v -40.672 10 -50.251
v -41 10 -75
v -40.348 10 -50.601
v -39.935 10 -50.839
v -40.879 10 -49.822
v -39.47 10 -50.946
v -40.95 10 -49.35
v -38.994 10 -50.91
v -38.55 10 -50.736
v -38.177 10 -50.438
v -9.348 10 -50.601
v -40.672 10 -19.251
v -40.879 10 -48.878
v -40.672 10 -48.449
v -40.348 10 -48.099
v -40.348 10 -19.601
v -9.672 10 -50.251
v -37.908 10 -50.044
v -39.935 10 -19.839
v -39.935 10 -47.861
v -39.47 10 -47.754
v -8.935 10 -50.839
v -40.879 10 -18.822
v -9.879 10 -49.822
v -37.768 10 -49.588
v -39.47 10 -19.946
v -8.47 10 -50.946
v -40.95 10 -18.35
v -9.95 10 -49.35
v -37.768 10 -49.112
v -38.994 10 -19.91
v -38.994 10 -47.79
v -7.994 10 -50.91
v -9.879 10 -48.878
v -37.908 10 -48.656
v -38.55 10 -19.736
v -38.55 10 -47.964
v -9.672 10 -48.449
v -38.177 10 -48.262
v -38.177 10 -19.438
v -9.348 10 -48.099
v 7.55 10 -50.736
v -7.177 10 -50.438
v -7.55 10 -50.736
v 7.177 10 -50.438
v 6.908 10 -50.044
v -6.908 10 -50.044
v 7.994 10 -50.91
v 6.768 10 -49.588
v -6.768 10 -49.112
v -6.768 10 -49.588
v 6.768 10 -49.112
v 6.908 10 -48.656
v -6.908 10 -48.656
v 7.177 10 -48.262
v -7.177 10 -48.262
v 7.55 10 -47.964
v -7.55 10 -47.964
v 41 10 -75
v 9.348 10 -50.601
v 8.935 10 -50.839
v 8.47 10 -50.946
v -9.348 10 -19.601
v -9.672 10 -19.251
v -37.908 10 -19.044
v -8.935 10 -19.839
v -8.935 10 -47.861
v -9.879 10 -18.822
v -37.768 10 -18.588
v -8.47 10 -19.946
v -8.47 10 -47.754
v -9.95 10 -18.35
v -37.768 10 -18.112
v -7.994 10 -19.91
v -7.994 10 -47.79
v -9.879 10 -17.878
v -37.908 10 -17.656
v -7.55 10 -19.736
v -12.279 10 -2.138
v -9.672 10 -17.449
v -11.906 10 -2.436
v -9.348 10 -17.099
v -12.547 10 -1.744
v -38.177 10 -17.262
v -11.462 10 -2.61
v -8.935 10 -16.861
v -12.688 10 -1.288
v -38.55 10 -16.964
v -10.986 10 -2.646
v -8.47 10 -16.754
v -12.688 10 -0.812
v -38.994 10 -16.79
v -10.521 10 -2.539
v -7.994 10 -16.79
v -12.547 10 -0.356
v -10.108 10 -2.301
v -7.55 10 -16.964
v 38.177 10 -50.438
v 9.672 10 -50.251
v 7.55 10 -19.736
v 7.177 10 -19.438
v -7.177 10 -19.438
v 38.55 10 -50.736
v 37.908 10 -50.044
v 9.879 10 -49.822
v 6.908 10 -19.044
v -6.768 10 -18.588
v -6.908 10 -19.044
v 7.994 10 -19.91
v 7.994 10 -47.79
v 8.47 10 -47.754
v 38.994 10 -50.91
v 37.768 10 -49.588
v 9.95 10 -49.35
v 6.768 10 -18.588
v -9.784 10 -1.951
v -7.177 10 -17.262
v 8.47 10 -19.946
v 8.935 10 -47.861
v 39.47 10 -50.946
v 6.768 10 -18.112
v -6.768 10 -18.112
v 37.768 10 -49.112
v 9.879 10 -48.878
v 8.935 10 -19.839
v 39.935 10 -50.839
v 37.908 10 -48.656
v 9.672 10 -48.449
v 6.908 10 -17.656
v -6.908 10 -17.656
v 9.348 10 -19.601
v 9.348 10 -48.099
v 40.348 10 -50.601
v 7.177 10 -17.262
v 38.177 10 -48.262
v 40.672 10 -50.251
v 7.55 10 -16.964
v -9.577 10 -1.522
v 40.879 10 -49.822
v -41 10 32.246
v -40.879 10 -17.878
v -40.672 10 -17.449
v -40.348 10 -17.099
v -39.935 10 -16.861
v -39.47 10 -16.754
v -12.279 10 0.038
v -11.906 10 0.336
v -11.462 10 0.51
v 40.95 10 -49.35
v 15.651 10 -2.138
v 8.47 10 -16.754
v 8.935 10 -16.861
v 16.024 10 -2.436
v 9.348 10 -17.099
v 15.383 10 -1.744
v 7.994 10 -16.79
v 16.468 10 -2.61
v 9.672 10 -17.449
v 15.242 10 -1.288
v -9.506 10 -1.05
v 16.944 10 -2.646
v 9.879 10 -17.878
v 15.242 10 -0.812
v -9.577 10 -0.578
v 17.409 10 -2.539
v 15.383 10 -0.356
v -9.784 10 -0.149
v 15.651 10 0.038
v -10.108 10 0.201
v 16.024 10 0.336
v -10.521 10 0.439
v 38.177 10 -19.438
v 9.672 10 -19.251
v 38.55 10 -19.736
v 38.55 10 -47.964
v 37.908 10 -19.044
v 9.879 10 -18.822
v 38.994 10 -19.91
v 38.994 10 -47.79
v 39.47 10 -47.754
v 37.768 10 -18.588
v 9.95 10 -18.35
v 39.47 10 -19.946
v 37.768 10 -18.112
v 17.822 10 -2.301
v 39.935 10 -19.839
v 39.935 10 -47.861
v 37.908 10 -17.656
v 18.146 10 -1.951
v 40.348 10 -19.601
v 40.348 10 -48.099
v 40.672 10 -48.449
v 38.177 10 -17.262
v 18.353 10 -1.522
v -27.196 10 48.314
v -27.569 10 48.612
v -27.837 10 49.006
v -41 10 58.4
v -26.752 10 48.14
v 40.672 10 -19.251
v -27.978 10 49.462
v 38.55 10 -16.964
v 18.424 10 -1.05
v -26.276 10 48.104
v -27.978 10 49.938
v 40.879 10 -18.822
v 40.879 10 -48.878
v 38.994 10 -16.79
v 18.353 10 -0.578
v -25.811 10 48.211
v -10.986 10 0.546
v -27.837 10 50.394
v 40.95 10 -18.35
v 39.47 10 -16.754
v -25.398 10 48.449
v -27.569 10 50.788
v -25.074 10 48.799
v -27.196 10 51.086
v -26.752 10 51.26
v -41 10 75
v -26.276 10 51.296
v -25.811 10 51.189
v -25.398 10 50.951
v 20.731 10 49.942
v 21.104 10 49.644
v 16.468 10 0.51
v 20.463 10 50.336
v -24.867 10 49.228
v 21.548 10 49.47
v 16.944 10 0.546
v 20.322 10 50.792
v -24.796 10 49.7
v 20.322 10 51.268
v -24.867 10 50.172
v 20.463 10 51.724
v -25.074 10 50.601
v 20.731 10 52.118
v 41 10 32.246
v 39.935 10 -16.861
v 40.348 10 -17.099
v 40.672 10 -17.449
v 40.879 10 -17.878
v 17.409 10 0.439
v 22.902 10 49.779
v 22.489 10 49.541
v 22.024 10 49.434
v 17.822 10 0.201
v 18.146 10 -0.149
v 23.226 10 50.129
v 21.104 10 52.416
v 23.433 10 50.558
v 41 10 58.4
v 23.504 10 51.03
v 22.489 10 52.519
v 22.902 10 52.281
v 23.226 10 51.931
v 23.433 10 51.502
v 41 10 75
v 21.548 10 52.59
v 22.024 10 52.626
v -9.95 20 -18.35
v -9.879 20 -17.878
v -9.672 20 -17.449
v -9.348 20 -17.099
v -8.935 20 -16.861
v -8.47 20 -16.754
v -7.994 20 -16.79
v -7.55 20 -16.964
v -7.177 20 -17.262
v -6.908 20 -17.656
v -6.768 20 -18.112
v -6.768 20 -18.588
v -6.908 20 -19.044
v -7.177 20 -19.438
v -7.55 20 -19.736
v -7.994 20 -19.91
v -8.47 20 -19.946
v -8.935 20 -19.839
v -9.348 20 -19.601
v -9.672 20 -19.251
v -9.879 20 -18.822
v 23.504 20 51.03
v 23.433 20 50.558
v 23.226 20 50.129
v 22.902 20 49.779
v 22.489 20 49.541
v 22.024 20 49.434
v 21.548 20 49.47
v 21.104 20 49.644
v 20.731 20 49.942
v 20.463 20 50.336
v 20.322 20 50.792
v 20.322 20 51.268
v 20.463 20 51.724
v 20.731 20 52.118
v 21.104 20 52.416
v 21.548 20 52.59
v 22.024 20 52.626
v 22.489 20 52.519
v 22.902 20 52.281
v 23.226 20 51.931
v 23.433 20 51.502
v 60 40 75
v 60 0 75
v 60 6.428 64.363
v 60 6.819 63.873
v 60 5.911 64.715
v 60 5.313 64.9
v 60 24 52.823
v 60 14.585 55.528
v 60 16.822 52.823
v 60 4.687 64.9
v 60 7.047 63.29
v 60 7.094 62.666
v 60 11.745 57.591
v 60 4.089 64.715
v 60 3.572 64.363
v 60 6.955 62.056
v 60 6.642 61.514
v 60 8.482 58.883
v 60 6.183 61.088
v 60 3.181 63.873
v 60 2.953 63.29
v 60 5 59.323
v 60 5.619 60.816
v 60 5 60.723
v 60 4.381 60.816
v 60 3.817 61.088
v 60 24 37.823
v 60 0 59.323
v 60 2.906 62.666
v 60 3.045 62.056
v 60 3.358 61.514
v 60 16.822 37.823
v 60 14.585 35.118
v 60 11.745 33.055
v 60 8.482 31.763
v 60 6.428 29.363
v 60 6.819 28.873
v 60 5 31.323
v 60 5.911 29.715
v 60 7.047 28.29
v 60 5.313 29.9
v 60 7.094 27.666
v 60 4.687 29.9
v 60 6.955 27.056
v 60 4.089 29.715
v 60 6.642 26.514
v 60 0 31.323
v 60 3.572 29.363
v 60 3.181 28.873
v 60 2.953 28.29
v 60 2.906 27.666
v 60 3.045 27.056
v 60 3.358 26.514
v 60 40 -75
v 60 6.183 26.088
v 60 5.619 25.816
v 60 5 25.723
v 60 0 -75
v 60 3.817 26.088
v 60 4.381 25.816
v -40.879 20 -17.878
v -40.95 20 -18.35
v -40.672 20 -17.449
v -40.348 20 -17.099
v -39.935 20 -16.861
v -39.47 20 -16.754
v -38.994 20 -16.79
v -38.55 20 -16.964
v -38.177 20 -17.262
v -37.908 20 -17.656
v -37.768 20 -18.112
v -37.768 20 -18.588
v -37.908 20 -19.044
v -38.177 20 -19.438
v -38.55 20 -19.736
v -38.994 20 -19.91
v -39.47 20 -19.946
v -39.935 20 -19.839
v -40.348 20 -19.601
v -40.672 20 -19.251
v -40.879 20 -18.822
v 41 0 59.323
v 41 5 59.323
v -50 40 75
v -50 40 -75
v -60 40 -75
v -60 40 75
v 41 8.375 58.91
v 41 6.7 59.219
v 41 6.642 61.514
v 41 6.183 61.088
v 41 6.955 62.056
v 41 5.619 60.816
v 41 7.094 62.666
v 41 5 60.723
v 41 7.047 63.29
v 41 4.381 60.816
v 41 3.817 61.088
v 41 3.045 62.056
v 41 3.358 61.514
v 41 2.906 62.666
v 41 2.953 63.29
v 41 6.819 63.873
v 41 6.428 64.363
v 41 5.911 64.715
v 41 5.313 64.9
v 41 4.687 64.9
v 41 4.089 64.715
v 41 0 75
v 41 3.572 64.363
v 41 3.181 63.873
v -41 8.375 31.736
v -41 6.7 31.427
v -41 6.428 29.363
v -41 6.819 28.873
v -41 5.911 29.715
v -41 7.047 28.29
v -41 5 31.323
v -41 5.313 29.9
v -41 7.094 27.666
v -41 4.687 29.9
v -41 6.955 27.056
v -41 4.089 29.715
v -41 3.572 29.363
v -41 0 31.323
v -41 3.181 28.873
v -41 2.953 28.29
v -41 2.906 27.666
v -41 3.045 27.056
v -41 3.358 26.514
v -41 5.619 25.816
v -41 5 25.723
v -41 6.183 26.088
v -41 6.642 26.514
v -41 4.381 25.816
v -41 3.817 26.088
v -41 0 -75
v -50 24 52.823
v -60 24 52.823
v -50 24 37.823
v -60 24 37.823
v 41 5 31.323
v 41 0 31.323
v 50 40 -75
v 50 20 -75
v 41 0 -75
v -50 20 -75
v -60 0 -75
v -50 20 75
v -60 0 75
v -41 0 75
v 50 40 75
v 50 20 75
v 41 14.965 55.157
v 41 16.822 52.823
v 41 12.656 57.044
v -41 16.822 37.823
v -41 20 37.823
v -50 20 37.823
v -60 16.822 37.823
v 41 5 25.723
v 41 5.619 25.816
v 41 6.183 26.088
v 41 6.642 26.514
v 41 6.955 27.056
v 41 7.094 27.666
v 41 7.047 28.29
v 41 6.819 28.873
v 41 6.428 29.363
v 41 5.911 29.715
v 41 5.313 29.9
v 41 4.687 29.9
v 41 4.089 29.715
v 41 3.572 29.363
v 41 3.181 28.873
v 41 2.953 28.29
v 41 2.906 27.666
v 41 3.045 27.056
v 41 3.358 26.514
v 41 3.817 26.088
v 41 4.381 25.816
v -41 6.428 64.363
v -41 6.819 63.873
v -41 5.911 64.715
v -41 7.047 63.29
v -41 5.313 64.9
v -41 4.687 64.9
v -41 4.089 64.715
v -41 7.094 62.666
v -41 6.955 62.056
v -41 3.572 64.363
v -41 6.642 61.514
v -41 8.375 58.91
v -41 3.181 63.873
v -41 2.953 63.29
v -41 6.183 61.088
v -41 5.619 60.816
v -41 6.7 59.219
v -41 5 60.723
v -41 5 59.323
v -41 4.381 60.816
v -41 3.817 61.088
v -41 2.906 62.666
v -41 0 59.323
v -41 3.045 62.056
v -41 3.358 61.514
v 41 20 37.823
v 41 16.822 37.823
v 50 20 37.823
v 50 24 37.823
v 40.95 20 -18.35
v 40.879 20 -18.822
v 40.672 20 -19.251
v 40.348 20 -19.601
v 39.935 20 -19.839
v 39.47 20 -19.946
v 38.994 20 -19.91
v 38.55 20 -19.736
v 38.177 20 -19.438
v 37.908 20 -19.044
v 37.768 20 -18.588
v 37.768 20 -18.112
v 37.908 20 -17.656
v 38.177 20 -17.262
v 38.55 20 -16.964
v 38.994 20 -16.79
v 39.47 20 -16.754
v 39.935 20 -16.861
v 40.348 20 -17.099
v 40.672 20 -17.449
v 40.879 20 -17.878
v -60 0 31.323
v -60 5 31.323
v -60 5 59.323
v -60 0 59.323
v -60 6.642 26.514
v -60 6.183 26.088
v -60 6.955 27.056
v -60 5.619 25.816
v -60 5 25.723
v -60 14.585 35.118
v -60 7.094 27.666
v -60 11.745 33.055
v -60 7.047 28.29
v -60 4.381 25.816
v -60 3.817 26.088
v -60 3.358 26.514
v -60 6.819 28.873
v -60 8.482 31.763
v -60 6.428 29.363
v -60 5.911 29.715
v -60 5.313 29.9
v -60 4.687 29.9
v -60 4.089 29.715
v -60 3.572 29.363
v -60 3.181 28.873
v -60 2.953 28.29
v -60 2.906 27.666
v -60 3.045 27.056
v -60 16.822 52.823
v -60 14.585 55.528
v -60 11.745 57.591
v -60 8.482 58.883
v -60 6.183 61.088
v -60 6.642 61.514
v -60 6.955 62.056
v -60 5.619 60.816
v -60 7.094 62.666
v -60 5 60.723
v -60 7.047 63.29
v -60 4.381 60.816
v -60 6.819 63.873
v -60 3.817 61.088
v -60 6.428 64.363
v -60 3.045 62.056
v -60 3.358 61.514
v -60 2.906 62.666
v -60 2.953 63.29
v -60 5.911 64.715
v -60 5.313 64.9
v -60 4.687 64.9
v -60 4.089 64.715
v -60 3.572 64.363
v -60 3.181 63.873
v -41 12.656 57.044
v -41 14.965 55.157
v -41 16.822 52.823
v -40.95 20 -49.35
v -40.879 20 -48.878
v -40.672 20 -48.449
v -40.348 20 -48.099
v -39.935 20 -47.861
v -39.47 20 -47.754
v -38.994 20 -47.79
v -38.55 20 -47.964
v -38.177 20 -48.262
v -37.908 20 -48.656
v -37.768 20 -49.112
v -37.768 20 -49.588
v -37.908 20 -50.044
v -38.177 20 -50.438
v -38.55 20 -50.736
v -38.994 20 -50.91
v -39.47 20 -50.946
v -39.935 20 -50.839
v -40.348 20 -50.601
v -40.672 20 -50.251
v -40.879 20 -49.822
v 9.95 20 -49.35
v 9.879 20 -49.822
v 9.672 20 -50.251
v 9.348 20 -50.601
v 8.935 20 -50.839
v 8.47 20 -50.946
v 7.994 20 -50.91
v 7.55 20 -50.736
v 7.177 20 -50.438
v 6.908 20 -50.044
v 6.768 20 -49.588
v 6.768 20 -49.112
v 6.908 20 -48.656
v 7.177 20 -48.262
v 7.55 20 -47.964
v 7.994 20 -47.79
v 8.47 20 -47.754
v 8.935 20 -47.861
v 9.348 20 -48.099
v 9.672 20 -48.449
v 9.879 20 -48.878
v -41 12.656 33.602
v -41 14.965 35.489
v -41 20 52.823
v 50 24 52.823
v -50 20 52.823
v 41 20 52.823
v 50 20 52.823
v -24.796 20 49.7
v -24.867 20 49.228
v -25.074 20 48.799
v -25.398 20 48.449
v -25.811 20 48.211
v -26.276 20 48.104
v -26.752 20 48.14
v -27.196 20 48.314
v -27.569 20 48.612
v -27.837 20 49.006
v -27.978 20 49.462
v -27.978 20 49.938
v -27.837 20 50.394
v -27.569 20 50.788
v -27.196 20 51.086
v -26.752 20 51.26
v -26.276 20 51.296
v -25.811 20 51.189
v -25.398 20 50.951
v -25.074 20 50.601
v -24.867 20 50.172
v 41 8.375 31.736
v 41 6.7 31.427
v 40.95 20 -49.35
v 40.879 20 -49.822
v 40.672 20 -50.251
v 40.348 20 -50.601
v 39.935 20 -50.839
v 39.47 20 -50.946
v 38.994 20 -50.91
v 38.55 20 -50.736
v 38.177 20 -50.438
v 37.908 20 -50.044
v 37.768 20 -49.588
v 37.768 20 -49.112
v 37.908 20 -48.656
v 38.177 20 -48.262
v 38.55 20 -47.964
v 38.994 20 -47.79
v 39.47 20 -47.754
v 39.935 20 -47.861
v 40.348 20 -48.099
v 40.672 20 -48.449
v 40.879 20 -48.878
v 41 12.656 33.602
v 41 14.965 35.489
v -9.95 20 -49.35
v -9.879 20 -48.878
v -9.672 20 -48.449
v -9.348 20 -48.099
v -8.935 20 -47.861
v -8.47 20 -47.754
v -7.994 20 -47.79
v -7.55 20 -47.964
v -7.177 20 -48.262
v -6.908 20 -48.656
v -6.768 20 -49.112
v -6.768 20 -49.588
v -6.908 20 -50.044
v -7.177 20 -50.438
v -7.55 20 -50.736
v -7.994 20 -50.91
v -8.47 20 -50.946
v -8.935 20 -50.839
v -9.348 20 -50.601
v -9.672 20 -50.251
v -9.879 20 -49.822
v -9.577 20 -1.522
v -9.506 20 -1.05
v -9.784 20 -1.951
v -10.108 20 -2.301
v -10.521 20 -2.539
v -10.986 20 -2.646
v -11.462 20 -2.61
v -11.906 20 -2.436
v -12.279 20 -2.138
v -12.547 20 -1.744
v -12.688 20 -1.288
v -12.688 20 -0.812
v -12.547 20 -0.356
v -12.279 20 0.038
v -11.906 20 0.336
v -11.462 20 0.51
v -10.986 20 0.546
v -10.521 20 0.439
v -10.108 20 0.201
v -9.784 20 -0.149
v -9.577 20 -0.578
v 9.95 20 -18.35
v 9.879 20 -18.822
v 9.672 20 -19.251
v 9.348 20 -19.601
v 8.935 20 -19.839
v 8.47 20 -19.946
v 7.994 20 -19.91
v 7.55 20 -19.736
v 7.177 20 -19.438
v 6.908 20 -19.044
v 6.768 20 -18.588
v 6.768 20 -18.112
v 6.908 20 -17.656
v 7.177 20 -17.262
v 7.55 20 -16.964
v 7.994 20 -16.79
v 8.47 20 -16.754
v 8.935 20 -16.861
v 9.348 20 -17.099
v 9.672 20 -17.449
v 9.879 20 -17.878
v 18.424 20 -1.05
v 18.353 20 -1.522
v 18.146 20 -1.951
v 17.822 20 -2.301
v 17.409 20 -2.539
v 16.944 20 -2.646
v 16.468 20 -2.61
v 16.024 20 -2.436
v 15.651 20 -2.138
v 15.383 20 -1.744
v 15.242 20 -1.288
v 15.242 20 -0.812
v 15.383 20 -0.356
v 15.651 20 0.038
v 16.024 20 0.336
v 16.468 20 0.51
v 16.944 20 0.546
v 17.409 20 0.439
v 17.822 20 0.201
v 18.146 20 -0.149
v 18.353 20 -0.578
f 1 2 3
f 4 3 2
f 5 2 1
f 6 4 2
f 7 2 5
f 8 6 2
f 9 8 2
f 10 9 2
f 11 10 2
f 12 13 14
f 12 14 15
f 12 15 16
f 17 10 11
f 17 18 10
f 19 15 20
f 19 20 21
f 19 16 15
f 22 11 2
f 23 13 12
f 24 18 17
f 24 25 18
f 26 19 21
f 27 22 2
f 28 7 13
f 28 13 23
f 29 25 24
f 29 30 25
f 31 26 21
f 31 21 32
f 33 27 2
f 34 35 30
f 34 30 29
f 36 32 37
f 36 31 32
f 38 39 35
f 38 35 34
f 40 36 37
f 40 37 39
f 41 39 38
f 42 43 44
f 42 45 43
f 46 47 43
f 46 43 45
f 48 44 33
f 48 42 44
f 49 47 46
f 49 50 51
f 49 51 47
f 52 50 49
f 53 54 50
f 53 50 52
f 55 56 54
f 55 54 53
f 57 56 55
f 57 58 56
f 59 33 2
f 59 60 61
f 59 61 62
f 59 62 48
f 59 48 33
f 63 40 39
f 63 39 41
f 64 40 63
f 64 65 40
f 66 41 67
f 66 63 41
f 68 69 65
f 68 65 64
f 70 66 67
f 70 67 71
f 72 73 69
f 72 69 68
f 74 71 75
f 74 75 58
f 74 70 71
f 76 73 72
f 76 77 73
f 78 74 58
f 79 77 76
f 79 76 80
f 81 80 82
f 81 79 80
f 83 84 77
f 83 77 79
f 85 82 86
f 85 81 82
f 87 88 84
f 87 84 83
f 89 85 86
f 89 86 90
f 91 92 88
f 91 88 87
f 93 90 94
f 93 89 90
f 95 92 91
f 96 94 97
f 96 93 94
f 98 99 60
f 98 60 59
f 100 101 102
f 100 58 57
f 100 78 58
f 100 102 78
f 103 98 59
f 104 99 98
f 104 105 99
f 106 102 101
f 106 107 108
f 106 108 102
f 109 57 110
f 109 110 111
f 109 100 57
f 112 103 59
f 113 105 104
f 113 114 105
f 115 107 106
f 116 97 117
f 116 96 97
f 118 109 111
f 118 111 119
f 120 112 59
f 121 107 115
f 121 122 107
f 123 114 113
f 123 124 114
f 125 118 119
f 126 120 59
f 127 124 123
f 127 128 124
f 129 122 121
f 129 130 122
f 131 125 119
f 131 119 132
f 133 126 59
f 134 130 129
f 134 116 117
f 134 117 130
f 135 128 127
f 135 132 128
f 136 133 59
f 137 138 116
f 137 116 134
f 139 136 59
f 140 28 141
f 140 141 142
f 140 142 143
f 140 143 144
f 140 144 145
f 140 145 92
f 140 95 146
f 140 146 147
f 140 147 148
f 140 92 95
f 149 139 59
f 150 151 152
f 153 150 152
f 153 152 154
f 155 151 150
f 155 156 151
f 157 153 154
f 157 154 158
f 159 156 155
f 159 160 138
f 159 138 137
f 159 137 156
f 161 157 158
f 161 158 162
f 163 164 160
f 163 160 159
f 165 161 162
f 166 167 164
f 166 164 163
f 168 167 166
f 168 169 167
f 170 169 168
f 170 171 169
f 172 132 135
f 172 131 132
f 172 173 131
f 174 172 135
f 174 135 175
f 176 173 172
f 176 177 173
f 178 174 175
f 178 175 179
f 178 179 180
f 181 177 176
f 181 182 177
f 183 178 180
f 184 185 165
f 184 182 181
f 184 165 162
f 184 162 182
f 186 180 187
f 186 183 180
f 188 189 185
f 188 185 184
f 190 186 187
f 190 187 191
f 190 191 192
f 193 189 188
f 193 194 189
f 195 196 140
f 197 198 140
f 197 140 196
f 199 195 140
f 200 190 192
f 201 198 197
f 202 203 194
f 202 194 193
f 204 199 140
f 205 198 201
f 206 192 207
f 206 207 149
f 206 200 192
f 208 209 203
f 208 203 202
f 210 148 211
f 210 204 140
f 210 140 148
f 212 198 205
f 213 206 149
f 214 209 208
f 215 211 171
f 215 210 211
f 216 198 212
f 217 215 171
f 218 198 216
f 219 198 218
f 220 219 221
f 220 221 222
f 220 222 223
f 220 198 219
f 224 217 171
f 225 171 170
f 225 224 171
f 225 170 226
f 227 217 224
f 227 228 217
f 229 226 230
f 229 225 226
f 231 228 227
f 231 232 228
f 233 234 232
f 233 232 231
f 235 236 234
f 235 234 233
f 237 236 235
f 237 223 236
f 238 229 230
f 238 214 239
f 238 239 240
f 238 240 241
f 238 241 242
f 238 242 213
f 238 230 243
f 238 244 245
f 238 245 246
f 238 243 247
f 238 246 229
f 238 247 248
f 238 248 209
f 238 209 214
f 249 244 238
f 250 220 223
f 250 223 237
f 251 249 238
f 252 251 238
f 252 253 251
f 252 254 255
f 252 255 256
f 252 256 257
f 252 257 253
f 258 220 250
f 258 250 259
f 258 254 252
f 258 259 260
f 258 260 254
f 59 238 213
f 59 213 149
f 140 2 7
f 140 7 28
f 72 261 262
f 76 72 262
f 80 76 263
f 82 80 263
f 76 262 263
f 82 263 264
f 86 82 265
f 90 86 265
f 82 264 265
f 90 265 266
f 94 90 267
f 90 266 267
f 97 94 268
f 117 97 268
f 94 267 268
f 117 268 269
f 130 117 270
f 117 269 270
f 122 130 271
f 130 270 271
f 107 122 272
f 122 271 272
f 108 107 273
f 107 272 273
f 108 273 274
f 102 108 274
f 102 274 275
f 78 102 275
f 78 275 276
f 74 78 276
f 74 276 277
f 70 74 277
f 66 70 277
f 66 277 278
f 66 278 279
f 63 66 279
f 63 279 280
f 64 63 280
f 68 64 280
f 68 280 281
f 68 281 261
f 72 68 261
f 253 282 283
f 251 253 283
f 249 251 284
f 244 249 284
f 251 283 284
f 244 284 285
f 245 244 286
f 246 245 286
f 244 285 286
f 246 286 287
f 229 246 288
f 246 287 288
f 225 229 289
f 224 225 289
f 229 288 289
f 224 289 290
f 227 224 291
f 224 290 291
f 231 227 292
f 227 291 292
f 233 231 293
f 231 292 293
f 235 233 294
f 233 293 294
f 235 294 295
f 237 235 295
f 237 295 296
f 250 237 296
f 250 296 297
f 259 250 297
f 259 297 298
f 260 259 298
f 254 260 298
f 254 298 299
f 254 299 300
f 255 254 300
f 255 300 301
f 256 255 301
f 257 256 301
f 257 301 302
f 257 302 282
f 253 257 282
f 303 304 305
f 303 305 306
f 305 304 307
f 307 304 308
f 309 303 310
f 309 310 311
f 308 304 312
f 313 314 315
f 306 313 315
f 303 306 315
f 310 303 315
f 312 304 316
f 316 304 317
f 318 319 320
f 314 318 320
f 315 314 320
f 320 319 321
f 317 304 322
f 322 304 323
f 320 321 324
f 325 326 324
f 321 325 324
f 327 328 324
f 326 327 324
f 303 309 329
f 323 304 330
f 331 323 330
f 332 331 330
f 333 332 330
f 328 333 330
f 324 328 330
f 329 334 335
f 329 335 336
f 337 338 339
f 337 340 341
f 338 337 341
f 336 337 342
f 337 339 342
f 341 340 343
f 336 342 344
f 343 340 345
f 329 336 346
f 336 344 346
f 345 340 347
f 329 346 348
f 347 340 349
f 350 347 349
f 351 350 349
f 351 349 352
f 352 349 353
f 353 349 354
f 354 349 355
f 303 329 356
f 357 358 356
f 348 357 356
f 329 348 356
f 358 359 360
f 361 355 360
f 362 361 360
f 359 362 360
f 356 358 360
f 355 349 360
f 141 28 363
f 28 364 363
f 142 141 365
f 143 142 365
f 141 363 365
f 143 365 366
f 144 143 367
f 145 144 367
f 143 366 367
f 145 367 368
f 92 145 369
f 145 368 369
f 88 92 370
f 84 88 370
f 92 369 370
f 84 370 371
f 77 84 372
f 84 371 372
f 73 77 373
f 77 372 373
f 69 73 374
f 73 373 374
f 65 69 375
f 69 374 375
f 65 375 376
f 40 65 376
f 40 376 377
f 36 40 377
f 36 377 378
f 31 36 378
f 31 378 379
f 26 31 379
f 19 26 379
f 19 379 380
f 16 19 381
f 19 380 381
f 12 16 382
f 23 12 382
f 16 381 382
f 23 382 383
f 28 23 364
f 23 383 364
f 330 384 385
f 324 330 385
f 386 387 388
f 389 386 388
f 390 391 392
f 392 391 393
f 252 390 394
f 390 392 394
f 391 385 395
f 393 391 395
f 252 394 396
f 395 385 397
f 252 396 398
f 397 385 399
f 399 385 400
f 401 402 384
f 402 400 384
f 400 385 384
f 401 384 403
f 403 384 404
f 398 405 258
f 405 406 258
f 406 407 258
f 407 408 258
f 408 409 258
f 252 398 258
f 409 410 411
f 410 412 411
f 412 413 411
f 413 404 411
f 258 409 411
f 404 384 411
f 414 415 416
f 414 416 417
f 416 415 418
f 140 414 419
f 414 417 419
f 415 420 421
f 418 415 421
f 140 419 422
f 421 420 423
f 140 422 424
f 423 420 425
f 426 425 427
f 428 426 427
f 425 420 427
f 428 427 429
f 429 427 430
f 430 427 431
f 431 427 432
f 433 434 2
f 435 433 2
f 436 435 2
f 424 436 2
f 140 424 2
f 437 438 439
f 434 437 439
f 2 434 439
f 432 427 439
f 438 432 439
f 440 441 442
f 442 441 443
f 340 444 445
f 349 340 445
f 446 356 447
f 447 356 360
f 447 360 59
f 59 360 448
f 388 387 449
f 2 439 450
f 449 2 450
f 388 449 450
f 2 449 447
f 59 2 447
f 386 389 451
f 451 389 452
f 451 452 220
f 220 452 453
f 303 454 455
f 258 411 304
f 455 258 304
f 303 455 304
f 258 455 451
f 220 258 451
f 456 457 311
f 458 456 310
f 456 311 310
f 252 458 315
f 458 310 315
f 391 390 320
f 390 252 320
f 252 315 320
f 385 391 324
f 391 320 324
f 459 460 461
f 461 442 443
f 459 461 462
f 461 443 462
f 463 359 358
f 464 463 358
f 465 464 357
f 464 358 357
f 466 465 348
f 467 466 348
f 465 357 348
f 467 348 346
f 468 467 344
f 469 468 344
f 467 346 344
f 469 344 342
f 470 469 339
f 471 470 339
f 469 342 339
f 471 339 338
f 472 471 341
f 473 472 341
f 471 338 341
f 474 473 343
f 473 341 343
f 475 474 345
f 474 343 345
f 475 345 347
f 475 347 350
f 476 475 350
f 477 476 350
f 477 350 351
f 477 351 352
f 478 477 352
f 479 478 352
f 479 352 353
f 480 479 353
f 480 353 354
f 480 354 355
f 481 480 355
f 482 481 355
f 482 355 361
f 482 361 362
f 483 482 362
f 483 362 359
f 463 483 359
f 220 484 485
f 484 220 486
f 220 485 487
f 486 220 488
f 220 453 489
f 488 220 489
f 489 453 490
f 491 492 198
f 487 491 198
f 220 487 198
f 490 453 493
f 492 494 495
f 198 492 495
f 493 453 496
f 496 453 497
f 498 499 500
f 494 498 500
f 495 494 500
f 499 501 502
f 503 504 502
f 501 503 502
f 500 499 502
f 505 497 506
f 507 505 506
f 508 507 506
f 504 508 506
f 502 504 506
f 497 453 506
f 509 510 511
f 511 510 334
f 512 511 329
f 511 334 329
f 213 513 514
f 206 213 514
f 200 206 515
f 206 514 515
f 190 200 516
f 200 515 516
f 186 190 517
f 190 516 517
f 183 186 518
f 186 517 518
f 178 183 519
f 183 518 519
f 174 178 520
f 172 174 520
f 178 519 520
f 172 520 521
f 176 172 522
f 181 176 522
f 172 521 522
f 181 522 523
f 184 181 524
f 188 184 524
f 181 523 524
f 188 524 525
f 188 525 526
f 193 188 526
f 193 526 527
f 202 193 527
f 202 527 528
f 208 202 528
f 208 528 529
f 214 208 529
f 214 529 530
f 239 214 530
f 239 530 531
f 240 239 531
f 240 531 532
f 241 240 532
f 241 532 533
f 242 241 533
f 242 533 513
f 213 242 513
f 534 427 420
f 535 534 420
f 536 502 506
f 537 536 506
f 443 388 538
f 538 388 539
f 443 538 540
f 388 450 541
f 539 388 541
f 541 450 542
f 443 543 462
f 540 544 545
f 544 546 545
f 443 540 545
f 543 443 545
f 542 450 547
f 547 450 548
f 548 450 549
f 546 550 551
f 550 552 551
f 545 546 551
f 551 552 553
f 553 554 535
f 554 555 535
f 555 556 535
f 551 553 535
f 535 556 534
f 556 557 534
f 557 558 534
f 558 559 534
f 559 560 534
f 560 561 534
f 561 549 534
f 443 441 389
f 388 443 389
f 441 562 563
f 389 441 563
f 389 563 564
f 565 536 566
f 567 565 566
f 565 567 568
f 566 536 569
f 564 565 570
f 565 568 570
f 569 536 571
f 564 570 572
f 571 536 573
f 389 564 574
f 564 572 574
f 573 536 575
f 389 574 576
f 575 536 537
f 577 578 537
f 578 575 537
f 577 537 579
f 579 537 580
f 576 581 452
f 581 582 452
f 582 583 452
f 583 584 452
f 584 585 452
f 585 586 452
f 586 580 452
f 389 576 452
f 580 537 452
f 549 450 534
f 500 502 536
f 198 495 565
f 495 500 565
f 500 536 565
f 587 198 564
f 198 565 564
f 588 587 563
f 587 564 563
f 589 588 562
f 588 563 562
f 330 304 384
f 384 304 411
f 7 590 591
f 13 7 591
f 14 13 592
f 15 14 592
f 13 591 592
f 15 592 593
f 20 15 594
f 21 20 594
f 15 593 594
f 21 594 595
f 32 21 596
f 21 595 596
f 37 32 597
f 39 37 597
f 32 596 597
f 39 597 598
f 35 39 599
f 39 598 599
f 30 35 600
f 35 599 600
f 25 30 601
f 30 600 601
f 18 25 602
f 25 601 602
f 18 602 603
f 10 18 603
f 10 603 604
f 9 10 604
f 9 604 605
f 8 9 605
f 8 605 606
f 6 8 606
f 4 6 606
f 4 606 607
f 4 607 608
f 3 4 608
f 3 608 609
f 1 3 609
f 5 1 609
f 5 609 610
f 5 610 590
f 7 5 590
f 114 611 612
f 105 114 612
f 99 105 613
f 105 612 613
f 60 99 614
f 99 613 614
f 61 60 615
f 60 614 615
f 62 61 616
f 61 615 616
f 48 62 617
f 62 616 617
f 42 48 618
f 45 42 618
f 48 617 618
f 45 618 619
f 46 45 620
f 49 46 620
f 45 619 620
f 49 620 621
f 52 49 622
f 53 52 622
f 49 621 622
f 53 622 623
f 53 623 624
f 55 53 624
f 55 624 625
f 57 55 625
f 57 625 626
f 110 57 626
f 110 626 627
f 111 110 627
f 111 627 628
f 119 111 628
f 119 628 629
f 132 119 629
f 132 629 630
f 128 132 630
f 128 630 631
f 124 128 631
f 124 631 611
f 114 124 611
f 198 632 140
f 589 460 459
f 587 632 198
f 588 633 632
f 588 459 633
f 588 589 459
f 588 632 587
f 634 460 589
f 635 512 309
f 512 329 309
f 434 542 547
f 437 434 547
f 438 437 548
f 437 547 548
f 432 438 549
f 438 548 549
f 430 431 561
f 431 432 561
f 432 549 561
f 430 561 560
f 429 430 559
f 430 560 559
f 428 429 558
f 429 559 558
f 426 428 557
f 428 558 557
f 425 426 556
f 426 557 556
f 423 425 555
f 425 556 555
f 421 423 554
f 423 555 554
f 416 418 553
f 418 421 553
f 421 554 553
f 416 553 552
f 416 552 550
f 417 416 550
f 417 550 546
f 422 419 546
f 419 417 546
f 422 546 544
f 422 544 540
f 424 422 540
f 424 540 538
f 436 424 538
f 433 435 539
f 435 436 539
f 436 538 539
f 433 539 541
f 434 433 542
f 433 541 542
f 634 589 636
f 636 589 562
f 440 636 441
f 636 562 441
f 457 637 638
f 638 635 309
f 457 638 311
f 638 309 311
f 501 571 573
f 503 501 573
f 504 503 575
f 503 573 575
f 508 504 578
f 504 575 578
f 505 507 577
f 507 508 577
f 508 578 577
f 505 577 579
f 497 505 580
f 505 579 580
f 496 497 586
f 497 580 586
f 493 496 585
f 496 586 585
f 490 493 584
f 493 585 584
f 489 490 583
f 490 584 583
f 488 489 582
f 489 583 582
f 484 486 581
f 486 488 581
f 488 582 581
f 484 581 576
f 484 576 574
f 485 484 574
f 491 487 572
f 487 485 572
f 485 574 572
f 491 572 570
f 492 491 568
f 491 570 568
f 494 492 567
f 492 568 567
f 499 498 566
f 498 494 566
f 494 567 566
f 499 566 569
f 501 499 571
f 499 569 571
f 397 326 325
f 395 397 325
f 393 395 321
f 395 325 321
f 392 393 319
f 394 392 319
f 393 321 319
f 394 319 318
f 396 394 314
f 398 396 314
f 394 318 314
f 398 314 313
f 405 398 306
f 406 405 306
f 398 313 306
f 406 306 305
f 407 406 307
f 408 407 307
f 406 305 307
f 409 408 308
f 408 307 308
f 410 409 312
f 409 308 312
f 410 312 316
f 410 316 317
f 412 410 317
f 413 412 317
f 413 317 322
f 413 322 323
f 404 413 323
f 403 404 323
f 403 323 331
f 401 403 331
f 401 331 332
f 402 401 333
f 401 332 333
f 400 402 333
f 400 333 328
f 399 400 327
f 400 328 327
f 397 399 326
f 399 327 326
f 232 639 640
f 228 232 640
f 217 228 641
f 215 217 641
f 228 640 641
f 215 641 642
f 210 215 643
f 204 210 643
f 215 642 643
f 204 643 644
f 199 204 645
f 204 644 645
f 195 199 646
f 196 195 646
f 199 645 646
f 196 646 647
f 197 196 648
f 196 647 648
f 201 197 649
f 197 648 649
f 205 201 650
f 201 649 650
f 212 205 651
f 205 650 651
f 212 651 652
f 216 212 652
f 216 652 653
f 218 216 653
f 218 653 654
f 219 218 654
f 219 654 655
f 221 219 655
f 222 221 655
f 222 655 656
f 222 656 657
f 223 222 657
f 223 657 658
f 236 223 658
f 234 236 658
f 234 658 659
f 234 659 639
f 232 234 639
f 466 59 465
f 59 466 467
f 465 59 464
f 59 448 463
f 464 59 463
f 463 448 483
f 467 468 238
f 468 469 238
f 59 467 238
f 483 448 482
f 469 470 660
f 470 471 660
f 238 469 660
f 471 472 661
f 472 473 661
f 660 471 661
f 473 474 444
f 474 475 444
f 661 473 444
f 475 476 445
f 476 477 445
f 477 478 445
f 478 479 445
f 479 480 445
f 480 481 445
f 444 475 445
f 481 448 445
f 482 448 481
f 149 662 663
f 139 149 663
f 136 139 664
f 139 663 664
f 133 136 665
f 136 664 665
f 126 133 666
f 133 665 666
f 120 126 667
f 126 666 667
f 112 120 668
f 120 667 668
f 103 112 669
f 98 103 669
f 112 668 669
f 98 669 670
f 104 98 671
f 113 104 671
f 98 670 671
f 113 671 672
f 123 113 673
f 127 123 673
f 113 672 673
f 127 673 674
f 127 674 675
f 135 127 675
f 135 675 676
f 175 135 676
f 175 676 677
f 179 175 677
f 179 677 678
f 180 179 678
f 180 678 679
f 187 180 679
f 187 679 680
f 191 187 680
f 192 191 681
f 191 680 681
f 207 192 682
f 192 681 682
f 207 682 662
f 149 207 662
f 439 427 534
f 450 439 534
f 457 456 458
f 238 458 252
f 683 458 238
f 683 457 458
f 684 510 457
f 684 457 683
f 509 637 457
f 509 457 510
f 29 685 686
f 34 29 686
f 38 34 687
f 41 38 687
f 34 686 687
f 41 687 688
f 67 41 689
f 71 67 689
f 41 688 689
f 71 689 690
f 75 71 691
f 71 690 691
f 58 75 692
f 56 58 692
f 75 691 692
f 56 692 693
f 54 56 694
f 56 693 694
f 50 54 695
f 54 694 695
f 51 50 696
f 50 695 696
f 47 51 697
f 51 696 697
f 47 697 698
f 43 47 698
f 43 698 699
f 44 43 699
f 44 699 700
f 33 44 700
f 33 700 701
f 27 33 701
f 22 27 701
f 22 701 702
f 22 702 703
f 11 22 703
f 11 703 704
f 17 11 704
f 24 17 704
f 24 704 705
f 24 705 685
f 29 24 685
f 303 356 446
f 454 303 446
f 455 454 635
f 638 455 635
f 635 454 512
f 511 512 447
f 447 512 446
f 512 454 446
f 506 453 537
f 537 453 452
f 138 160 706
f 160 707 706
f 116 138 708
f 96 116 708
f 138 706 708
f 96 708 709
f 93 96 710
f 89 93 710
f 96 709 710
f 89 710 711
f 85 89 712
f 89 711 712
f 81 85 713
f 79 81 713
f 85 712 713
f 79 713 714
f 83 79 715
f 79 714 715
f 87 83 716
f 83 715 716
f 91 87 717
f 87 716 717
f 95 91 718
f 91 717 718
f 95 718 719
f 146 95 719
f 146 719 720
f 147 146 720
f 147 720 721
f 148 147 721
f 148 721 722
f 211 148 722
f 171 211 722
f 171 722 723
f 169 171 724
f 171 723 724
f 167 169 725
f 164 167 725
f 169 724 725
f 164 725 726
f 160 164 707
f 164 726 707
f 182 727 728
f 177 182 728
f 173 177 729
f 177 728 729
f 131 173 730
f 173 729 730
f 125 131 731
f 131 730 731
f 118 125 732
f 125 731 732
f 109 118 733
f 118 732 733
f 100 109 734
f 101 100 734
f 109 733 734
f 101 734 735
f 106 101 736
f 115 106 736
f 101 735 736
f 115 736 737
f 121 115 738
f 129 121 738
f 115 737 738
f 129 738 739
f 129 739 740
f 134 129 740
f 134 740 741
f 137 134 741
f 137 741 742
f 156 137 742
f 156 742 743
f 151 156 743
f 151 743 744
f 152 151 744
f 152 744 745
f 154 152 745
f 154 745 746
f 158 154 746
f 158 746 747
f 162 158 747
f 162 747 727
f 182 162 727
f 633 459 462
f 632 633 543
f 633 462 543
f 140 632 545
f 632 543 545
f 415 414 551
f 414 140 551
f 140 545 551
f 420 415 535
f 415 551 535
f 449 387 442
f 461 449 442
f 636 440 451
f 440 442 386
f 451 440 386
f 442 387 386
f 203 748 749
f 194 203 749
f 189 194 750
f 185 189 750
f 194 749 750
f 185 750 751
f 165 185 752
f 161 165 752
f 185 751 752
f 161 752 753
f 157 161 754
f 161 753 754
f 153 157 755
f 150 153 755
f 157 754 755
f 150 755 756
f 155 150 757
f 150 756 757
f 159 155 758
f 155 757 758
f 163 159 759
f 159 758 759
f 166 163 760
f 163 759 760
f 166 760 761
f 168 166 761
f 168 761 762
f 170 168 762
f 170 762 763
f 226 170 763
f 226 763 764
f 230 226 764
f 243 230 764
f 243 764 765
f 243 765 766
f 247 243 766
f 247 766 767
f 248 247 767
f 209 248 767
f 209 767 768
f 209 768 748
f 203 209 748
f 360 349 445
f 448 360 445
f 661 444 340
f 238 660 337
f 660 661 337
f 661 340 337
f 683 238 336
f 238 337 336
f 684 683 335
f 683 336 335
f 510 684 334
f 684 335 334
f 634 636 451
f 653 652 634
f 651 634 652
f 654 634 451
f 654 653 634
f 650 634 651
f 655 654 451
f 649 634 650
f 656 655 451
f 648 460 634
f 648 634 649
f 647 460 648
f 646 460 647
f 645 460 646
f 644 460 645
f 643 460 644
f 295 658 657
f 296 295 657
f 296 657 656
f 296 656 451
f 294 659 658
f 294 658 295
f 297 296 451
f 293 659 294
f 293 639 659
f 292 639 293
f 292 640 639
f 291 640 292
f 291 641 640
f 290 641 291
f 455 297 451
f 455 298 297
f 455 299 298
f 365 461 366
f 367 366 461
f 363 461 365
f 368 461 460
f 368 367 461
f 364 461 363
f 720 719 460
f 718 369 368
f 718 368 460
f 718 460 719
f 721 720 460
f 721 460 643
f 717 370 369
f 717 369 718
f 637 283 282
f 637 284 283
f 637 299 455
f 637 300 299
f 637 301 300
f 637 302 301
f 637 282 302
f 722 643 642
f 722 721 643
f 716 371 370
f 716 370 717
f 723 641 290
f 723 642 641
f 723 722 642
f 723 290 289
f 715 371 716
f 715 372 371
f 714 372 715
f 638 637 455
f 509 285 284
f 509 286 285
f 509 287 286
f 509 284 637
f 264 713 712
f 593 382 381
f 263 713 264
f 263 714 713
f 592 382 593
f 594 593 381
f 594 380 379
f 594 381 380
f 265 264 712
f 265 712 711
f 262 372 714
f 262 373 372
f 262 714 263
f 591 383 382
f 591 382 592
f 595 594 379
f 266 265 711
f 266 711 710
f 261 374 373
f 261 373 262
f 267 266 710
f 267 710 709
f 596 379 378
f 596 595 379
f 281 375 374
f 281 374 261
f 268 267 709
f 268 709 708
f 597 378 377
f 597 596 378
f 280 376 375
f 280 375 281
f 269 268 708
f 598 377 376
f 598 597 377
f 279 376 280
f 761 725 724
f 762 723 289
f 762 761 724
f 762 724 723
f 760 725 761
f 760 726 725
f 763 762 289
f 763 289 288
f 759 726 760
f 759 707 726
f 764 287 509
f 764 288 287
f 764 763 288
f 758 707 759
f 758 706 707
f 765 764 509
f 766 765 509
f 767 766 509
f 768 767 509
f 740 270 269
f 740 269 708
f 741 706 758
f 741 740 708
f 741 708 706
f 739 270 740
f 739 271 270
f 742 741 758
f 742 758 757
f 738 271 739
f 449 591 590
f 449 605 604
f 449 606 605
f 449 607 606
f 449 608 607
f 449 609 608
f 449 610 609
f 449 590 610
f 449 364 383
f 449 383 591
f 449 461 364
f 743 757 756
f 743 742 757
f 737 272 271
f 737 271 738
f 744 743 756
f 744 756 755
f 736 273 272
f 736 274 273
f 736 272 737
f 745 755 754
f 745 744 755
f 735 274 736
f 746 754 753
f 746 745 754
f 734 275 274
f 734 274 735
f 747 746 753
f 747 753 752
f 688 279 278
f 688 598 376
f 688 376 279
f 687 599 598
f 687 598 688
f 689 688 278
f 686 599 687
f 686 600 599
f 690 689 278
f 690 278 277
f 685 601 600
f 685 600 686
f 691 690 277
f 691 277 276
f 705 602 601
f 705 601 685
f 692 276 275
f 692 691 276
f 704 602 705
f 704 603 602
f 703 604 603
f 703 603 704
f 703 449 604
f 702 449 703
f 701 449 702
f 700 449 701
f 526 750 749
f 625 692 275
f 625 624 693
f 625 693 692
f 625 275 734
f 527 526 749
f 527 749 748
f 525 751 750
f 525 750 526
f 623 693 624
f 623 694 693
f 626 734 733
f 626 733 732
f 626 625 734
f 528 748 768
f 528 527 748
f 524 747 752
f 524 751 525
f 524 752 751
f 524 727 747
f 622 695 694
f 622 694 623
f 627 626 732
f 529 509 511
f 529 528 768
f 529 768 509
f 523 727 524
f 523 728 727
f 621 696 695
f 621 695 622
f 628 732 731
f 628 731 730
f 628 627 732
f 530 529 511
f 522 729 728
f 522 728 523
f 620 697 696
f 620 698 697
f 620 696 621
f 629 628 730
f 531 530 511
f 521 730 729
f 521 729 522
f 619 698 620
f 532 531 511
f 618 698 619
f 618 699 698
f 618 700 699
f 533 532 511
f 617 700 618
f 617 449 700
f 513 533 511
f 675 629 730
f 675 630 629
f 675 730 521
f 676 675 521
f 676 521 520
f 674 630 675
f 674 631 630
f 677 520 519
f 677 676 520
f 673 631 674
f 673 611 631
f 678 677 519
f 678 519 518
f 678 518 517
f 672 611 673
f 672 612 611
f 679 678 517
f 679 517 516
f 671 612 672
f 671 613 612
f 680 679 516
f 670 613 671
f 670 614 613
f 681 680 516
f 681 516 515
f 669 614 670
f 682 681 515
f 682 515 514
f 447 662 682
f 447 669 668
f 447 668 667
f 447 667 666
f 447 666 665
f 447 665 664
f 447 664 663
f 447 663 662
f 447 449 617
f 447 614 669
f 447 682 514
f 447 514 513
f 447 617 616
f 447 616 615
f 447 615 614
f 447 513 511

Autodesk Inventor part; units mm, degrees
ref_plane "YZ Plane" through (0, 0, 0) normal (1, 0, 0) x (0, 1, 0)
ref_plane "XZ Plane" through (0, 0, 0) normal (0, 1, 0) x (-1, 0, 0)
ref_plane "XY Plane" through (0, 0, 0) normal (0, 0, 1) x (1, 0, 0)
sketch "스케치1" plane through (0, 0, 0) normal (0, 1, 0) x (-1, 0, 0)
  line L0 (60, 75) -> (-60, 75)
  line L1 (-60, 75) -> (-60, -75)
  line L2 (-60, -75) -> (60, -75)
  line L3 (60, -75) -> (60, 75)
  line L4 (60, 75) -> (-60, -75) construction
  line L5 (-60, 75) -> (60, -75) construction
  point P0 (0, 0)
  dimension "d0" = 120
  dimension "d1" = 150
extrude "돌출1" add sketch "스케치1" along normal blind 40
sketch "스케치2" plane through (0, 40, 0) normal (0, 1, 0) x (1, 0, 0)
  line L0 (60, -75) -> (60, 75) projected
  line L1 (60, 75) -> (-60, 75) projected
  line L2 (50, 102.1646) -> (-50, 102.1646)
  line L3 (-50, 102.1646) -> (-50, -103.0725)
  line L4 (-50, -103.0725) -> (50, -103.0725)
  line L5 (50, -103.0725) -> (50, 102.1646)
  line L6 (-60, 75) -> (-60, -75) projected
  point P0 (0, 0)
  point P1 (50, 75)
  point P2 (-50, 75)
  dimension "d6" = 10
  dimension "d7" = 10
extrude "돌출2" cut sketch "스케치2" against normal blind 20 contours L5 L4 L3 L1
sketch "스케치3" plane through (60, 0, 75) normal (1, 0, 0) x (0, 0, -1)
  circle A0 centre (29.6769, 5) radius 14
  circle A1 centre (120, 5) radius 14
  line L0 (150, 0) -> (150, 40) projected
  line L1 (0, 0) -> (150, 0) projected
  point P0 (75, 0)
  dimension "d10" = 28
  dimension "d12" = 28
  dimension "d13" = 30
  dimension "d16" = 5
  dimension "d30" = 5
extrude "돌출3" cut sketch "스케치3" against normal blind 19 contours A0 L1 | L1 A0
sketch "스케치4" plane through (60, 0, -75) normal (1, 0, 0) x (0, 0, -1)
  arc A0 (-107.2464, 0) -> (-133.3998, 0) centre (-120.3231, 5) ccw projected
  line L0 (-134.3231, 36.9687) -> (-106.3231, 36.9687)
  line L1 (-106.3231, 36.9687) -> (-106.3231, -26.9687)
  line L2 (-106.3231, -26.9687) -> (-134.3231, -26.9687)
  line L3 (-134.3231, -26.9687) -> (-134.3231, 36.9687)
  line L4 (-134.3231, 36.9687) -> (-106.3231, -26.9687) construction
  line L5 (-106.3231, 36.9687) -> (-134.3231, -26.9687) construction
  line L6 (-150, 0) -> (-133.3998, 0) projected
  line L7 (-107.2464, 0) -> (0, 0) projected
  point P0 (-75, 0)
  point P1 (-134.3231, 0)
  point P2 (-134.3231, 5)
  point P3 (-106.3231, 0)
  point P4 (-106.3231, 5)
  dimension "d17" = 28
extrude "돌출4" cut sketch "스케치4" against normal blind 19 contours A0 L1 L7 | A0 L6 L3
sketch "스케치5" plane through (60, 0, -75) normal (1, 0, 0) x (0, 0, -1)
  line L0 (-127.8231, 12) -> (-112.8231, 12)
  line L1 (-112.8231, 12) -> (-112.8231, 24)
  line L2 (-112.8231, 24) -> (-127.8231, 24)
  line L3 (-127.8231, 24) -> (-127.8231, 12)
  line L4 (-127.8231, 12) -> (-112.8231, 24) construction
  line L5 (-112.8231, 12) -> (-127.8231, 24) construction
  arc A0 (-106.3231, 5) -> (-134.3231, 5) centre (-120.3231, 5) ccw projected
  point P0 (-75, 0)
  point P1 (-120.3231, 18)
  point P2 (-120.3231, 10)
  dimension "d20" = 15
  dimension "d32" = 19
  dimension "d33" = 0
extrude "돌출5" cut sketch "스케치5" against normal blind 19
sketch "스케치6" plane through (60, 0, -75) normal (1, 0, 0) x (0, 0, -1)
  arc A0 (-106.3231, 5) -> (-134.3231, 5) centre (-120.3231, 5) ccw projected
  point P0 (-75, 0)
  point P1 (-127.8231, 16.8216)
sketch "스케치7" plane through (60, 0, -75) normal (1, 0, 0) x (0, 0, -1)
  circle A0 centre (-120.3231, 5) radius 17.5 construction
  circle A1 centre (-102.8231, 5) radius 2.1
  circle A2 centre (-137.8231, 5) radius 2.1
  point P0 (-75, 0)
  dimension "d34" = 35
  dimension "d35" = 4.2
  dimension "d36" = 4.2
extrude "돌출6" cut sketch "스케치7" against normal blind 19
mirror "미러1" about plane through (0, 0, 0) normal (1, 0, 0) of "돌출6", "돌출5", "돌출4", "돌출3"
sketch "스케치8" plane through (0, 0, 0) normal (0, -1, 0) x (1, 0, 0)
  line L0 (-41, -88.7468) -> (41, -88.7468)
  line L1 (41, -88.7468) -> (41, 88.7468)
  line L2 (41, 88.7468) -> (-41, 88.7468)
  line L3 (-41, 88.7468) -> (-41, -88.7468)
  line L4 (-41, -88.7468) -> (41, 88.7468) construction
  line L5 (41, -88.7468) -> (-41, 88.7468) construction
  line L6 (41, 31.3231) -> (41, 59.3231) projected
  point P0 (0, 0)
  dimension "d39" = 0
extrude "돌출7" cut sketch "스케치8" against normal blind 10
sketch "스케치9" plane through (0, 20, 0) normal (0, 1, 0) x (1, 0, 0)
  line L0 (-28.9457, -65) -> (24.4543, -65)
  line L1 (24.4543, -65) -> (24.4543, 3.6)
  line L2 (24.4543, 3.6) -> (-28.9457, 3.6)
  line L3 (-28.9457, 3.6) -> (-28.9457, -65)
  line L4 (50, -75) -> (-50, -75) projected
  circle A0 centre (-26.3957, -49.7) radius 1.6
  circle A1 centre (21.9043, -51.03) radius 1.6
  circle A2 centre (16.8243, 1.05) radius 1.6
  circle A3 centre (-11.1057, 1.05) radius 1.6
  point P0 (0, 0)
  dimension "d42" = 53.4
  dimension "d43" = 68.6
  dimension "d44" = 10
  dimension "d45" = 3.2
  dimension "d46" = 15.3
  dimension "d47" = 2.55
  dimension "d51" = 3.2
  dimension "d52" = 2.55
  dimension "d56" = 13.97
  dimension "d57" = 3.2
  dimension "d58" = 7.63
  dimension "d59" = 2.55
  dimension "d60" = 3.2
  dimension "d61" = 2.55
  dimension "d62" = 35.56
extrude "돌출8" cut sketch "스케치9" against normal through all contours A0 | A1 | A2 | A3
sketch "스케치10" plane through (0, 20, 0) normal (0, 1, 0) x (1, 0, 0)
  line L0 (50, -75) -> (-50, -75) projected
  line L1 (2.7, 12.7) -> (45, 12.7)
  line L2 (45, 12.7) -> (45, 55)
  line L3 (45, 55) -> (2.7, 55)
  line L4 (2.7, 55) -> (2.7, 12.7)
  line L5 (-50, -75) -> (-50, 75) projected
  line L6 (50, 75) -> (50, -75) projected
  line L7 (39.35, 18.35) -> (8.35, 18.35)
  line L8 (8.35, 18.35) -> (8.35, 49.35)
  line L9 (8.35, 49.35) -> (39.35, 49.35)
  line L10 (39.35, 49.35) -> (39.35, 18.35)
  line L11 (39.35, 18.35) -> (8.35, 49.35) construction
  line L12 (8.35, 18.35) -> (39.35, 49.35) construction
  line L13 (-50, 75) -> (50, 75) projected
  circle A0 centre (8.35, 49.35) radius 1.6
  circle A1 centre (8.35, 18.35) radius 1.6
  circle A2 centre (39.35, 18.35) radius 1.6
  circle A3 centre (39.35, 49.35) radius 1.6
  point P0 (0, 0)
  point P1 (23.85, 33.85)
  dimension "d68" = 42.3
  dimension "d69" = 42.3
  dimension "d71" = 5
  dimension "d72" = 31
  dimension "d73" = 31
  dimension "d75" = 21.15
  dimension "d76" = 21.15
  dimension "d77" = 20
  dimension "d79" = 3.2
  dimension "d80" = 3.2
  dimension "d81" = 3.2
  dimension "d82" = 3.2
extrude "돌출9" cut sketch "스케치10" against normal through all contours A1 L8 L7 | L7 L8 A1 | A2 L10 L7 | L7 L10 A2 | A0 L9 L8 | L8 L9 A0 | A3 L9 L10 | L10 L9 A3
mirror "미러2" about plane through (0, 0, 0) normal (1, 0, 0) of "돌출9"
properties part number "본체판(구)"
